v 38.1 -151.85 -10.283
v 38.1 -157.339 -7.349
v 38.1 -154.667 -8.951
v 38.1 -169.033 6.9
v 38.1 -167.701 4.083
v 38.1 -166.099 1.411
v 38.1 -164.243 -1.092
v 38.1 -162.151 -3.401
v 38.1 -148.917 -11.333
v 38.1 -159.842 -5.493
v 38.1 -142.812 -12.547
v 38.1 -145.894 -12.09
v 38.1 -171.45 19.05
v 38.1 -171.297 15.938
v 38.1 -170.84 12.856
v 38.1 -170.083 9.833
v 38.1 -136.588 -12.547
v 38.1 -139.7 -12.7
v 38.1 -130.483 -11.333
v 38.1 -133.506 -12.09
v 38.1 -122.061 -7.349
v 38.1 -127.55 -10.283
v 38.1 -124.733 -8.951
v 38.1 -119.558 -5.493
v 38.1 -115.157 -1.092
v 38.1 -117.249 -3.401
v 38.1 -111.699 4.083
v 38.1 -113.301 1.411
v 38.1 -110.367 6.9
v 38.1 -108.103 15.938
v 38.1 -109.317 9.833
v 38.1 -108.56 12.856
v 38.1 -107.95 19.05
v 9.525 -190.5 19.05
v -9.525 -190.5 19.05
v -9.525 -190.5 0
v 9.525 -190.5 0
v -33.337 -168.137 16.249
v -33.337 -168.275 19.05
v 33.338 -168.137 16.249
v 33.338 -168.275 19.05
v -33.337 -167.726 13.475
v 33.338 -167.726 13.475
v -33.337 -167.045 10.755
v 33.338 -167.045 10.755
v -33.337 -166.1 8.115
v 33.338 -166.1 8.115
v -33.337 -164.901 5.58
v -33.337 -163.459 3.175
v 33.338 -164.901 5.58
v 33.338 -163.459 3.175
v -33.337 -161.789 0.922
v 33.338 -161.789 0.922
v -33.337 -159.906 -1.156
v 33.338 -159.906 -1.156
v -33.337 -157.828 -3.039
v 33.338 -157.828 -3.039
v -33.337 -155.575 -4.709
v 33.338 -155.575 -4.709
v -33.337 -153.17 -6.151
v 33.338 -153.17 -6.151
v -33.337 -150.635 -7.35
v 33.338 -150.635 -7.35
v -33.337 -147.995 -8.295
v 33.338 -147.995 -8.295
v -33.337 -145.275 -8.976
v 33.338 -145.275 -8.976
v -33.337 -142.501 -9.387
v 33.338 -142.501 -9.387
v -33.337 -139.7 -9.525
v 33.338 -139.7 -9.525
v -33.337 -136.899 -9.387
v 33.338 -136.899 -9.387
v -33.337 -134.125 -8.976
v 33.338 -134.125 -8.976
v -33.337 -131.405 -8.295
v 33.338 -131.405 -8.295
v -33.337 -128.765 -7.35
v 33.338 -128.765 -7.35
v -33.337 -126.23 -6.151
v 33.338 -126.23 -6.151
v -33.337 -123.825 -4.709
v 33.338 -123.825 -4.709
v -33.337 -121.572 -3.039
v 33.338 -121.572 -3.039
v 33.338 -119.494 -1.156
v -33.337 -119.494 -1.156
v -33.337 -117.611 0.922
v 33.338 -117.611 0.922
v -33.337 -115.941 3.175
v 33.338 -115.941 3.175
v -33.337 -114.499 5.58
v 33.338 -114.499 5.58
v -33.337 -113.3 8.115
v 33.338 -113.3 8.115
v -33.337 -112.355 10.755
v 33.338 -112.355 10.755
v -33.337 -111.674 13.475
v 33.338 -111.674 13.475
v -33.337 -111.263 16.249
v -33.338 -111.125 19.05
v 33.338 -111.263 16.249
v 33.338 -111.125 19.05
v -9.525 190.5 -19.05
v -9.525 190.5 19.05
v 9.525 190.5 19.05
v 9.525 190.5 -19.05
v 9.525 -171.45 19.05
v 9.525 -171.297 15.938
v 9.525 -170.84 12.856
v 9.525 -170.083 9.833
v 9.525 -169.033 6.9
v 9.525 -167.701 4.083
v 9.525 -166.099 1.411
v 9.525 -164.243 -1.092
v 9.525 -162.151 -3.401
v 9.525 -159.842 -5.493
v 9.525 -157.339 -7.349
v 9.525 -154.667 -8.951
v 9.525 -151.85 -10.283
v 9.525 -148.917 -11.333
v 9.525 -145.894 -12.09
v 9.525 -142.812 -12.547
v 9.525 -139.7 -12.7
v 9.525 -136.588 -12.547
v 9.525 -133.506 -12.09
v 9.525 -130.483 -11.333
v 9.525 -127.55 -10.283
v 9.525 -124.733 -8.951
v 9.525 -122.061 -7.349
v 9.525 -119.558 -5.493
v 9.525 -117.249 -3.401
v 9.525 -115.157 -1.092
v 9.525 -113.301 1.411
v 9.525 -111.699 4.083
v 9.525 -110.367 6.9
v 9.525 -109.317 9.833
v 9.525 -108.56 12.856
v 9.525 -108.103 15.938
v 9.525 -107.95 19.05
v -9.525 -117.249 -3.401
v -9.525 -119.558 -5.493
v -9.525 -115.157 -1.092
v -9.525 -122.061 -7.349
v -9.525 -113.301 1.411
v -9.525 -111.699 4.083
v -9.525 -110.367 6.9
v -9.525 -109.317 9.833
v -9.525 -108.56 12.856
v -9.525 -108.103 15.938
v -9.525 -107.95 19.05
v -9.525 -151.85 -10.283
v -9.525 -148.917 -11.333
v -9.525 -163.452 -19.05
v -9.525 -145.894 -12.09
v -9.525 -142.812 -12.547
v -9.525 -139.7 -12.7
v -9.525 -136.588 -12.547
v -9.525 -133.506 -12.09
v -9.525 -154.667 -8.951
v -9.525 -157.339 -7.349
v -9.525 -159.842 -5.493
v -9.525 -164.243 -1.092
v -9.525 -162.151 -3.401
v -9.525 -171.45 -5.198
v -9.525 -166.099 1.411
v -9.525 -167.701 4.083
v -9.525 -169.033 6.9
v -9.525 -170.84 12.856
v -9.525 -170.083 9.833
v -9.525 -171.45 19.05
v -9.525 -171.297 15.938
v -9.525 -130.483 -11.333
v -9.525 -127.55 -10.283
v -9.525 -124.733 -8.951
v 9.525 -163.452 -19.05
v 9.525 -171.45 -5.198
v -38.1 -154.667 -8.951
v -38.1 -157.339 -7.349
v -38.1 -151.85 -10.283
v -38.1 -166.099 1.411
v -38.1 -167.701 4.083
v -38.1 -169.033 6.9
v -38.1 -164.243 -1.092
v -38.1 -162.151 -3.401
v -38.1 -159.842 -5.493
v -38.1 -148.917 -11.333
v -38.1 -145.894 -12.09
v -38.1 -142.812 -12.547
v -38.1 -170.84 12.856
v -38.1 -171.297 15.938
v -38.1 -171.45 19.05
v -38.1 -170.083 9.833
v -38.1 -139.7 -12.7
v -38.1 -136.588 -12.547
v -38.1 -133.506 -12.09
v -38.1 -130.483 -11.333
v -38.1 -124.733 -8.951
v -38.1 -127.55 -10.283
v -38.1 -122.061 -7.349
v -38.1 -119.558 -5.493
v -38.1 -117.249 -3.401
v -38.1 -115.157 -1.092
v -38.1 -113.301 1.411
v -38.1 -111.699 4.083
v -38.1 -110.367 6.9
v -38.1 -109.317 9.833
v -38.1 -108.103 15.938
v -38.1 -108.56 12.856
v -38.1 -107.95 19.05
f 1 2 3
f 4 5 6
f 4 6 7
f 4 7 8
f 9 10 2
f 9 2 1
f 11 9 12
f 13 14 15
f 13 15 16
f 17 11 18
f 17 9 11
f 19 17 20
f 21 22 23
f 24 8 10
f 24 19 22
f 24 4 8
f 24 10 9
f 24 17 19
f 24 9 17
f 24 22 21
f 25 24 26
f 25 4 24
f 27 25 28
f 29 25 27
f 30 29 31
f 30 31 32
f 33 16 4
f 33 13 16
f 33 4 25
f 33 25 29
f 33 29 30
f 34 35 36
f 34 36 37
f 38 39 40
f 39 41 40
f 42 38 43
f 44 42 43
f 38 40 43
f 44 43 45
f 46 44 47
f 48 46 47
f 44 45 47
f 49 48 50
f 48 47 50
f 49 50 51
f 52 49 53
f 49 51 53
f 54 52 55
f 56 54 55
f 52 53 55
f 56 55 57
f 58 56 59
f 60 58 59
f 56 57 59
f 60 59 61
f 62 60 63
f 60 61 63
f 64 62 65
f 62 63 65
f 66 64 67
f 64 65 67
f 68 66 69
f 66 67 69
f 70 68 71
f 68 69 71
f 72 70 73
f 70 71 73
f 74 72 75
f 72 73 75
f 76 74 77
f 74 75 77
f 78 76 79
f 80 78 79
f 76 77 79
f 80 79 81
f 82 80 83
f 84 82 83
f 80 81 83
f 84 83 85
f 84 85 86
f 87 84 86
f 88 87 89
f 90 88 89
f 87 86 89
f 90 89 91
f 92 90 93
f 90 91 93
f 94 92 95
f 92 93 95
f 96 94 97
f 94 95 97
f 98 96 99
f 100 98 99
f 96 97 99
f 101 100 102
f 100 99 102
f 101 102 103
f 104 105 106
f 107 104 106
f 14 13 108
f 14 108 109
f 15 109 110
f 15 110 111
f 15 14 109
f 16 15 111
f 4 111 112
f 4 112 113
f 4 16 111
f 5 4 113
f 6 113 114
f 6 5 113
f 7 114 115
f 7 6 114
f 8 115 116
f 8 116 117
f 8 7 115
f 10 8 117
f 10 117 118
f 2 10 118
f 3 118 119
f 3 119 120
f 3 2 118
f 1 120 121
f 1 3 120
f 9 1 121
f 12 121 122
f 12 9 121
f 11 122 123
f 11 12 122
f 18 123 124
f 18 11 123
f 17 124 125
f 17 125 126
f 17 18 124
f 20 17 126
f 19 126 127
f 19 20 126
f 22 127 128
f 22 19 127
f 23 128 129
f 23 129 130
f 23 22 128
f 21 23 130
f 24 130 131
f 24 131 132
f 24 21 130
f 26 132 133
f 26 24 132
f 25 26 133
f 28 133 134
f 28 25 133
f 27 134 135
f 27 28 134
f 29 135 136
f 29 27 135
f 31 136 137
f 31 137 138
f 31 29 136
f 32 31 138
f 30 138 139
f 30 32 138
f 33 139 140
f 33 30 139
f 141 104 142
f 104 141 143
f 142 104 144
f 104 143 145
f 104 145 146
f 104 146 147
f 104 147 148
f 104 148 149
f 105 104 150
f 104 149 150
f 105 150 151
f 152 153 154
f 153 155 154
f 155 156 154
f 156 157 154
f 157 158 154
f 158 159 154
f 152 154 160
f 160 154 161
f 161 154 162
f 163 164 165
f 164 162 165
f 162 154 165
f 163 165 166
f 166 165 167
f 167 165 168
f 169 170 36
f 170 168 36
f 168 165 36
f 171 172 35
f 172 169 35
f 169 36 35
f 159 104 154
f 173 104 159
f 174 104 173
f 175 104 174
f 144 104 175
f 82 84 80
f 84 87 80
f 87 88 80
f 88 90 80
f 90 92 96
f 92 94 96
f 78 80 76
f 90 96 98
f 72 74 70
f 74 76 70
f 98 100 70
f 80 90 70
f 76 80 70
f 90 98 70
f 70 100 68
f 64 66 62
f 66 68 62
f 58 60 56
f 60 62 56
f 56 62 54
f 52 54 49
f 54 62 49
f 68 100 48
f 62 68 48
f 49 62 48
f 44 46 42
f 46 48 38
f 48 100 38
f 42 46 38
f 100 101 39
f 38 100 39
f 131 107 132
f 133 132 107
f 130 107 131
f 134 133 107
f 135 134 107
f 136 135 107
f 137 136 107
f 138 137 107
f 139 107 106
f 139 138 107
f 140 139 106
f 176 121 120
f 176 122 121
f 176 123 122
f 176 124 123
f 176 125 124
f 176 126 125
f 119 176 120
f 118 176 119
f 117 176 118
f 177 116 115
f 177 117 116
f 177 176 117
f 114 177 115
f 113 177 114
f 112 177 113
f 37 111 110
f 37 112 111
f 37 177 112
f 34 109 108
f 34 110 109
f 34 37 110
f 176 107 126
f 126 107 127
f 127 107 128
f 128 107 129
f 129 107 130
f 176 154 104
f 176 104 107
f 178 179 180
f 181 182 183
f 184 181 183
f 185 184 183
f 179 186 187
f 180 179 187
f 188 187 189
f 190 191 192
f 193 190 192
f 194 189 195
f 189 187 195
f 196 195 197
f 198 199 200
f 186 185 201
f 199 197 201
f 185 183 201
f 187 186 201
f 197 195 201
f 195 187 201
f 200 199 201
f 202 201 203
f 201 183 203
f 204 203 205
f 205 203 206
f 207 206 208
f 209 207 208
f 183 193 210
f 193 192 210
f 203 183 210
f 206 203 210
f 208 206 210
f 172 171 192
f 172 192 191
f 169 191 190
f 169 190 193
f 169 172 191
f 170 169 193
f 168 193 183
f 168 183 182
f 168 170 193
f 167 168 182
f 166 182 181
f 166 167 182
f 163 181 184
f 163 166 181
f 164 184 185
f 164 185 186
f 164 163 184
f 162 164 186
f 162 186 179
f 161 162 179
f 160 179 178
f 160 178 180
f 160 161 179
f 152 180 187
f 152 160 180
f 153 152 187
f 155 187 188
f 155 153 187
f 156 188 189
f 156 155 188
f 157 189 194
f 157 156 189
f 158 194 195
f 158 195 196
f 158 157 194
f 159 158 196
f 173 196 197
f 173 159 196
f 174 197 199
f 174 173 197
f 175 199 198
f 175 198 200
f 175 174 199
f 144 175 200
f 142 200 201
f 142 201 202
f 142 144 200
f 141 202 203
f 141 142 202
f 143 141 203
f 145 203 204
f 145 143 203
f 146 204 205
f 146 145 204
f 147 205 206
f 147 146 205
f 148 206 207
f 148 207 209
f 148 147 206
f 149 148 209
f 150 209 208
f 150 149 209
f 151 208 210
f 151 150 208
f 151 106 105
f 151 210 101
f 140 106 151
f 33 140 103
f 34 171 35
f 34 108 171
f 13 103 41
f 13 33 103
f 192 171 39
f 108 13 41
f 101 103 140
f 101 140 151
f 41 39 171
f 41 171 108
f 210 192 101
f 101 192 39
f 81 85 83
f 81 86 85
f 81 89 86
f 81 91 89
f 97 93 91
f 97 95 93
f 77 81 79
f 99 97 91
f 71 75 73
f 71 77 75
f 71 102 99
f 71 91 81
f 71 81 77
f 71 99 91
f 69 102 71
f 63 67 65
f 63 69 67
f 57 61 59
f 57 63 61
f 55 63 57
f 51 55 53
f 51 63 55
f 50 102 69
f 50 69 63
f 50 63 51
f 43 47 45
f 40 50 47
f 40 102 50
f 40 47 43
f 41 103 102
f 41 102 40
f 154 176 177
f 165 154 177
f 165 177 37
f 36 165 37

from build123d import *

# Parameters (mm, degrees)
F0_W     = 19.05
F0_H     = 38.1
F1_DEPTH = 190.5
F3_DEPTH = 38.1
F6_W     = 66.675
F6_H     = 28.575
F9_DEPTH = 47.626


with BuildPart() as f1:
    # F0 (on Front) → F1 (new body, symmetric)
    with BuildSketch(Plane.XZ):
        Rectangle(F0_W, F0_H)
    extrude(amount=F1_DEPTH, both=True)

    # F2 (on Right) → F3 (join, symmetric)
    with BuildSketch(Plane.YZ):
        with BuildLine():
            Line((-107.95, 19.05), (-171.45, 19.05))
            ThreePointArc((-171.45, 19.05), (-139.7, -12.7), (-107.95, 19.05))
        make_face()
    extrude(amount=F3_DEPTH, both=True)

    # F6 (on face) → F7 (revolve, cut)
    with BuildSketch(Plane.XY.offset(19.05)):
        with Locations((0, -125.4125)):
            Rectangle(F6_W, F6_H)
    revolve(axis=Axis((58.379408, -139.7, 19.05), (1, 0, 0)), mode=Mode.SUBTRACT)

    # F8 (on face) → F9 (cut, through all)
    with BuildSketch(Plane.YZ.offset(9.525)):
        Polygon((-171.45, -5.197727), (-190.5, 0), (-190.5, -19.05), (-163.452387, -19.05), align=None)
    extrude(amount=-F9_DEPTH, mode=Mode.SUBTRACT)


solid = f1.part
